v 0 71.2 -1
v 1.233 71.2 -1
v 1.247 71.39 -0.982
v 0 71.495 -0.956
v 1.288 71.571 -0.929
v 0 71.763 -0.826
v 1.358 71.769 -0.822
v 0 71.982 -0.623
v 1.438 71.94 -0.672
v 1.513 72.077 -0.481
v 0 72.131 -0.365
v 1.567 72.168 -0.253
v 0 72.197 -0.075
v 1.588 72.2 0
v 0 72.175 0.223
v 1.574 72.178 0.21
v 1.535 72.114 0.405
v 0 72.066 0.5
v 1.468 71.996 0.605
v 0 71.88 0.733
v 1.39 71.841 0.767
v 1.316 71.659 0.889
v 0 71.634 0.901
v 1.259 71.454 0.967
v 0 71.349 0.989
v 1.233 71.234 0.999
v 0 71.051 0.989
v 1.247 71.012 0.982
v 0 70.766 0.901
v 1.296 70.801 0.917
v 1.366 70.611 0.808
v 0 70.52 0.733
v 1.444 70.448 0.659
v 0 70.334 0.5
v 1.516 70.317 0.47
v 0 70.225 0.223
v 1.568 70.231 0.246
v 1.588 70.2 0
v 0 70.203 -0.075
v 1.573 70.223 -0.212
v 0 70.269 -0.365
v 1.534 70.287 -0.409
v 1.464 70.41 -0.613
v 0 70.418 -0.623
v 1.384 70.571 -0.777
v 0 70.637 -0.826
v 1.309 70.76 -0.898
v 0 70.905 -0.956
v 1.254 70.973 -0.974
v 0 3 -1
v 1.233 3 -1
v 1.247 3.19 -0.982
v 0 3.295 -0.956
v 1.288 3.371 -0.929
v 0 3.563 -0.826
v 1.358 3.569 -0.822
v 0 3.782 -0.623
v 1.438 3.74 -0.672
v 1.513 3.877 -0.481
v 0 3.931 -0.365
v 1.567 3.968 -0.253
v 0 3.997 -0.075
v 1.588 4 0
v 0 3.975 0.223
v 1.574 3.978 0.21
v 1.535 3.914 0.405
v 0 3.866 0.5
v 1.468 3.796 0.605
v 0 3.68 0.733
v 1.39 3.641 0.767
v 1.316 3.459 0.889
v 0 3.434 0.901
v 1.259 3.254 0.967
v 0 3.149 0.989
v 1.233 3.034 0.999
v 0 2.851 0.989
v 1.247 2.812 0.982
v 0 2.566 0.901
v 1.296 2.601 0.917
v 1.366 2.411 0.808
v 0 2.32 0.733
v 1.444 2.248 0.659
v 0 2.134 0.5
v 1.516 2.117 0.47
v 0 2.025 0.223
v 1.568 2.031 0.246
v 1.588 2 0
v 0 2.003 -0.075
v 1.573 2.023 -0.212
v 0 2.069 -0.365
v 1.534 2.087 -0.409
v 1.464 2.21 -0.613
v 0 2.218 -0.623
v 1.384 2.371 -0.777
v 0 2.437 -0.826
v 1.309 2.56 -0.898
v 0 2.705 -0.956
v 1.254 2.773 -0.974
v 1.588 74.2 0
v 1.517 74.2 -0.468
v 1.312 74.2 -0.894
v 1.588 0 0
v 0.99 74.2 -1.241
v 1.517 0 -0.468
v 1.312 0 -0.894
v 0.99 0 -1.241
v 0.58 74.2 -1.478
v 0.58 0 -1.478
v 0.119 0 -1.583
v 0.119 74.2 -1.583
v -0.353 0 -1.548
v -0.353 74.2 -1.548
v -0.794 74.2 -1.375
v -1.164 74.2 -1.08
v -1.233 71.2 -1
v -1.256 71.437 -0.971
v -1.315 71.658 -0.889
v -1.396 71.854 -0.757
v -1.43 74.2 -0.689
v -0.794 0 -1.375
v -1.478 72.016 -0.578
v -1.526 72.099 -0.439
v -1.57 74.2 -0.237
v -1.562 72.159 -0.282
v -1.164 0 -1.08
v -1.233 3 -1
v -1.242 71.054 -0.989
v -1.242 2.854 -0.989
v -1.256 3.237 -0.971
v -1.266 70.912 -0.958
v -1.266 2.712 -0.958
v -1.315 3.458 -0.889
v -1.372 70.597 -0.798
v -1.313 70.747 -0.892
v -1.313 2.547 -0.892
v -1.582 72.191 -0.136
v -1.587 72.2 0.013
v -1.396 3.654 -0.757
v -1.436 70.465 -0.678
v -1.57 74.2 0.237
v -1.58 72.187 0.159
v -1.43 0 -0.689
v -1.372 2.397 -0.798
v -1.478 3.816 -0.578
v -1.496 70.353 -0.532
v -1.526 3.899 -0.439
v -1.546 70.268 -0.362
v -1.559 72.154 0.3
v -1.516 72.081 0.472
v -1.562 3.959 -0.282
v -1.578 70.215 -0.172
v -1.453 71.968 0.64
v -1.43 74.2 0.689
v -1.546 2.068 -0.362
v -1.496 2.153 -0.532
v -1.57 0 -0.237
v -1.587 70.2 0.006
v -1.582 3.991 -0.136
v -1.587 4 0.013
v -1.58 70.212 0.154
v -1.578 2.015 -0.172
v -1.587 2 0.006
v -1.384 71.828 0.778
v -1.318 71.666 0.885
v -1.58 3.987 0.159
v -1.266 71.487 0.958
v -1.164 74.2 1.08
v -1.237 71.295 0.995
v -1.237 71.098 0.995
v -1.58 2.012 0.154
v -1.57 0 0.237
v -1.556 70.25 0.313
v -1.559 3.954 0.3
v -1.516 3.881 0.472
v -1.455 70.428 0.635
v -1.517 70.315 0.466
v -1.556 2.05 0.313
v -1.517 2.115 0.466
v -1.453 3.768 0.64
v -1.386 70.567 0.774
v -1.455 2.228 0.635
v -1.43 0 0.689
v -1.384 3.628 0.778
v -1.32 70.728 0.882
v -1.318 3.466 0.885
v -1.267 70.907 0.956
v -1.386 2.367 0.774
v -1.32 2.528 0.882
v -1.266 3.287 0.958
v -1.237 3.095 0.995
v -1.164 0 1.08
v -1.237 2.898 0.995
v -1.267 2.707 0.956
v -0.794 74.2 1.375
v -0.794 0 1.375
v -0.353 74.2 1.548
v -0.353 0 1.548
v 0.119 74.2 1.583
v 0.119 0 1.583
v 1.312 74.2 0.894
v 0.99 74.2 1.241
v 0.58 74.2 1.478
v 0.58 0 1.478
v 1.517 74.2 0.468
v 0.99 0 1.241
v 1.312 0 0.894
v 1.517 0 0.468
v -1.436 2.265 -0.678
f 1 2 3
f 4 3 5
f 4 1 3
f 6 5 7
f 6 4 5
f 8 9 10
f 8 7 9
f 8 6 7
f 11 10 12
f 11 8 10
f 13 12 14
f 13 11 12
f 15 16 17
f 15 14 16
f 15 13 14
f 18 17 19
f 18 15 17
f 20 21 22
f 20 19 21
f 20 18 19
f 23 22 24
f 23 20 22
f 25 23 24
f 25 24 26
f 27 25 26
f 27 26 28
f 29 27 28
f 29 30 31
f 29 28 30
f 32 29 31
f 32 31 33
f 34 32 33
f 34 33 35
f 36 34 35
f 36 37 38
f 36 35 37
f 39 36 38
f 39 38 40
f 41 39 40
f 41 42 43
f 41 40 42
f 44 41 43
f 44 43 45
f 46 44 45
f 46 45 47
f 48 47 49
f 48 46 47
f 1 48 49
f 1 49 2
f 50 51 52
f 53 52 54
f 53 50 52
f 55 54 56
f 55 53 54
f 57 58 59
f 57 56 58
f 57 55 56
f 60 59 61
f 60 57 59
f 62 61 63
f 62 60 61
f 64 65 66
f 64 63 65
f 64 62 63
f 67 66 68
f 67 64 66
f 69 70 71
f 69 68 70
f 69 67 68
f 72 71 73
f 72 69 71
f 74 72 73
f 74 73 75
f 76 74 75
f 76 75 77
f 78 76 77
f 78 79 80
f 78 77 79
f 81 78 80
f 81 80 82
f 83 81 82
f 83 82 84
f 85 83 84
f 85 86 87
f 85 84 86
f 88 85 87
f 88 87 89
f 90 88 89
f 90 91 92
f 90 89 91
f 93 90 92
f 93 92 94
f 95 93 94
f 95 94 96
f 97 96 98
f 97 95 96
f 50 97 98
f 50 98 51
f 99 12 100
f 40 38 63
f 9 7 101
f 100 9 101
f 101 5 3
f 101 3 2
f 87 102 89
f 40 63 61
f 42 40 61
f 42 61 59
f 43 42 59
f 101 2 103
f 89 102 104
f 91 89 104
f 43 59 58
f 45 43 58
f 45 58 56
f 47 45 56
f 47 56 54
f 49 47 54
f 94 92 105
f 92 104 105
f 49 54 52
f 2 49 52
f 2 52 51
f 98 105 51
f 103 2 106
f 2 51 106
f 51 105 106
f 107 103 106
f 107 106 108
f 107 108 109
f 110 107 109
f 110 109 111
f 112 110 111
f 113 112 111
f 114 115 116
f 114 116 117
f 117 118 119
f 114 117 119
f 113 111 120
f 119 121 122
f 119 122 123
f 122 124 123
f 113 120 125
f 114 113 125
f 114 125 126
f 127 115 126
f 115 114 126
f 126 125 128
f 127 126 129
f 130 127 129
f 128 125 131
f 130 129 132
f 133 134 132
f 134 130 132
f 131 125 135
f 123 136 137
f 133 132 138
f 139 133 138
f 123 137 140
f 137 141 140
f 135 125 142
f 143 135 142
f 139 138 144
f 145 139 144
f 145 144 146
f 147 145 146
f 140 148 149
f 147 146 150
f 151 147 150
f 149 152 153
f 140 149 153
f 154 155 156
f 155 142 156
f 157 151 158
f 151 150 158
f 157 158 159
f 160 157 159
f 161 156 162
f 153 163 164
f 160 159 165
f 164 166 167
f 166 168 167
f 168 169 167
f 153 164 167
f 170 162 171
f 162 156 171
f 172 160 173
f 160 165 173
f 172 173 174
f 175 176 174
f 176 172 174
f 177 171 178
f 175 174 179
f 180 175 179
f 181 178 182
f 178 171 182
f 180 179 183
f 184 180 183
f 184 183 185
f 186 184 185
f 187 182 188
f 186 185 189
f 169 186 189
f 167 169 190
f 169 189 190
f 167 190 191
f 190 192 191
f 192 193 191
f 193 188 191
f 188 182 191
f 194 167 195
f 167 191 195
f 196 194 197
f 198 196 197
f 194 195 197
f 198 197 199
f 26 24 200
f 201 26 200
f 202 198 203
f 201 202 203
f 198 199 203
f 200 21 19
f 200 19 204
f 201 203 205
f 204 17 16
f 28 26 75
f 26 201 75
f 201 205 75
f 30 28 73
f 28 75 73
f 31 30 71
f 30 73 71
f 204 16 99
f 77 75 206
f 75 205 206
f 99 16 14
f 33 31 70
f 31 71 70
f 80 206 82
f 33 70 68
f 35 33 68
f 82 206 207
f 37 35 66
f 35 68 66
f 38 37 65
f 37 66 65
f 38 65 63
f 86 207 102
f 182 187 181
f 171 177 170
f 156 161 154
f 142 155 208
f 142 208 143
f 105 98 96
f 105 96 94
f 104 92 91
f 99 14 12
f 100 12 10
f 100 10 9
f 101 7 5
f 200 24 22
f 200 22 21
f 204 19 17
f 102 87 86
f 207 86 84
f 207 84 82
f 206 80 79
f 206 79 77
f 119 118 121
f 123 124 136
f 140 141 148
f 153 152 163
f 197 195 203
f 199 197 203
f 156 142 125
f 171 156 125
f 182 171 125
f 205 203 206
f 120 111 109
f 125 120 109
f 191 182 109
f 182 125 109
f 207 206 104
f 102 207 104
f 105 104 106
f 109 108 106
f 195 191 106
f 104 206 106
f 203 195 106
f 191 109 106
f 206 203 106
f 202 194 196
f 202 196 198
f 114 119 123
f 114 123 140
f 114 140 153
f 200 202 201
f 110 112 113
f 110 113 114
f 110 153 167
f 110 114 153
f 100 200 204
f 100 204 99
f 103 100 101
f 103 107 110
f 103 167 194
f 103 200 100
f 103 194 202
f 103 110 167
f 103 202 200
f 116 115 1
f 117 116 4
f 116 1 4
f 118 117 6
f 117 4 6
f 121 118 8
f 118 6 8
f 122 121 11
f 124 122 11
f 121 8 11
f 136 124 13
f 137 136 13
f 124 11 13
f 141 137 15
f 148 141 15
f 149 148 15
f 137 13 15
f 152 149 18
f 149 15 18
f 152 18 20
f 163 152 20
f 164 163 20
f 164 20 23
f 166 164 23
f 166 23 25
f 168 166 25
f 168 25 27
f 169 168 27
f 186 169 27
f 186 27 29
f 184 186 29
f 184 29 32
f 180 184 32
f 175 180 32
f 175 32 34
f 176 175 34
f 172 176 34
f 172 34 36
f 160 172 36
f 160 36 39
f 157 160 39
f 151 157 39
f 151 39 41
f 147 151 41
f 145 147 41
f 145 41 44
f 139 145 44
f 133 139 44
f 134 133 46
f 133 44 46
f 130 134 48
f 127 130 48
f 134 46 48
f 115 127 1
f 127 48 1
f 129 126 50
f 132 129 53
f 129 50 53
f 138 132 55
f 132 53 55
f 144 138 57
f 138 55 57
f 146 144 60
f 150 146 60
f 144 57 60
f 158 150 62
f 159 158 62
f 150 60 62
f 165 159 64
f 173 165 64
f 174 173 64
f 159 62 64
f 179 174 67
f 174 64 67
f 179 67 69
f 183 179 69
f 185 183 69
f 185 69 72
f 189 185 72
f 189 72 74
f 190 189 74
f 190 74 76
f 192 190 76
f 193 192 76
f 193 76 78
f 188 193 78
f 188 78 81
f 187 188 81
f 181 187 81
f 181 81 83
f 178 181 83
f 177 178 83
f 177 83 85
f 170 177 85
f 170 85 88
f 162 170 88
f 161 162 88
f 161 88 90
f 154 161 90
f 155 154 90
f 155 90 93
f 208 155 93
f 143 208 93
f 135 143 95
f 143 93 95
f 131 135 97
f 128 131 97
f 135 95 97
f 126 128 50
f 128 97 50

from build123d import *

# Parameters (mm, degrees)
SKETCH1_R                      = 1.5875
BOSS_EXTRUDE1_DEPTH            = 74.2
CUT_EXTRUDE1_REACH             = 3.587
SKETCH2_R                      = 1
CUT_EXTRUDE1_DIRECTION_2_REACH = 3.587


with BuildPart() as part:
    # Sketch1 → Boss-Extrude1 (new body)
    with BuildSketch(Plane(origin=(0, 0, 0), x_dir=(1, 0, 0), z_dir=(0, 1, 0))):
        Circle(SKETCH1_R)
    extrude(amount=BOSS_EXTRUDE1_DEPTH)

    # Sketch2 → Cut-Extrude1 (cut, up to next)
    with BuildSketch(Plane(origin=(0, 0, 0), x_dir=(0, 0, -1), z_dir=(1, 0, 0)), mode=Mode.PRIVATE) as cut_extrude1_sk1:
        with Locations((0, 71.2)):
            Circle(SKETCH2_R)
    cut_extrude1_tool1 = extrude(cut_extrude1_sk1.sketch, amount=-CUT_EXTRUDE1_REACH, mode=Mode.PRIVATE) & part.part
    add(cut_extrude1_tool1.solids().sort_by_distance((0, 71.2, 0))[0], mode=Mode.SUBTRACT)
    # Sketch2 → Cut-Extrude1 (cut, up to next)
    with BuildSketch(Plane(origin=(0, 0, 0), x_dir=(0, 0, -1), z_dir=(1, 0, 0)), mode=Mode.PRIVATE) as cut_extrude1_sk2:
        with Locations((0, 3)):
            Circle(SKETCH2_R)
    cut_extrude1_tool2 = extrude(cut_extrude1_sk2.sketch, amount=-CUT_EXTRUDE1_REACH, mode=Mode.PRIVATE) & part.part
    add(cut_extrude1_tool2.solids().sort_by_distance((0, 3, 0))[0], mode=Mode.SUBTRACT)

    # Sketch2 → Cut-Extrude1 direction 2 (cut, up to next)
    with BuildSketch(Plane(origin=(0, 0, 0), x_dir=(0, 0, -1), z_dir=(1, 0, 0)), mode=Mode.PRIVATE) as cut_extrude1_direction_2_sk1:
        with Locations((0, 71.2)):
            Circle(SKETCH2_R)
    cut_extrude1_direction_2_tool1 = extrude(cut_extrude1_direction_2_sk1.sketch, amount=CUT_EXTRUDE1_DIRECTION_2_REACH, mode=Mode.PRIVATE) & part.part
    add(cut_extrude1_direction_2_tool1.solids().sort_by_distance((0, 71.2, 0))[0], mode=Mode.SUBTRACT)
    # Sketch2 → Cut-Extrude1 direction 2 (cut, up to next)
    with BuildSketch(Plane(origin=(0, 0, 0), x_dir=(0, 0, -1), z_dir=(1, 0, 0)), mode=Mode.PRIVATE) as cut_extrude1_direction_2_sk2:
        with Locations((0, 3)):
            Circle(SKETCH2_R)
    cut_extrude1_direction_2_tool2 = extrude(cut_extrude1_direction_2_sk2.sketch, amount=CUT_EXTRUDE1_DIRECTION_2_REACH, mode=Mode.PRIVATE) & part.part
    add(cut_extrude1_direction_2_tool2.solids().sort_by_distance((0, 3, 0))[0], mode=Mode.SUBTRACT)


solid = part.part
